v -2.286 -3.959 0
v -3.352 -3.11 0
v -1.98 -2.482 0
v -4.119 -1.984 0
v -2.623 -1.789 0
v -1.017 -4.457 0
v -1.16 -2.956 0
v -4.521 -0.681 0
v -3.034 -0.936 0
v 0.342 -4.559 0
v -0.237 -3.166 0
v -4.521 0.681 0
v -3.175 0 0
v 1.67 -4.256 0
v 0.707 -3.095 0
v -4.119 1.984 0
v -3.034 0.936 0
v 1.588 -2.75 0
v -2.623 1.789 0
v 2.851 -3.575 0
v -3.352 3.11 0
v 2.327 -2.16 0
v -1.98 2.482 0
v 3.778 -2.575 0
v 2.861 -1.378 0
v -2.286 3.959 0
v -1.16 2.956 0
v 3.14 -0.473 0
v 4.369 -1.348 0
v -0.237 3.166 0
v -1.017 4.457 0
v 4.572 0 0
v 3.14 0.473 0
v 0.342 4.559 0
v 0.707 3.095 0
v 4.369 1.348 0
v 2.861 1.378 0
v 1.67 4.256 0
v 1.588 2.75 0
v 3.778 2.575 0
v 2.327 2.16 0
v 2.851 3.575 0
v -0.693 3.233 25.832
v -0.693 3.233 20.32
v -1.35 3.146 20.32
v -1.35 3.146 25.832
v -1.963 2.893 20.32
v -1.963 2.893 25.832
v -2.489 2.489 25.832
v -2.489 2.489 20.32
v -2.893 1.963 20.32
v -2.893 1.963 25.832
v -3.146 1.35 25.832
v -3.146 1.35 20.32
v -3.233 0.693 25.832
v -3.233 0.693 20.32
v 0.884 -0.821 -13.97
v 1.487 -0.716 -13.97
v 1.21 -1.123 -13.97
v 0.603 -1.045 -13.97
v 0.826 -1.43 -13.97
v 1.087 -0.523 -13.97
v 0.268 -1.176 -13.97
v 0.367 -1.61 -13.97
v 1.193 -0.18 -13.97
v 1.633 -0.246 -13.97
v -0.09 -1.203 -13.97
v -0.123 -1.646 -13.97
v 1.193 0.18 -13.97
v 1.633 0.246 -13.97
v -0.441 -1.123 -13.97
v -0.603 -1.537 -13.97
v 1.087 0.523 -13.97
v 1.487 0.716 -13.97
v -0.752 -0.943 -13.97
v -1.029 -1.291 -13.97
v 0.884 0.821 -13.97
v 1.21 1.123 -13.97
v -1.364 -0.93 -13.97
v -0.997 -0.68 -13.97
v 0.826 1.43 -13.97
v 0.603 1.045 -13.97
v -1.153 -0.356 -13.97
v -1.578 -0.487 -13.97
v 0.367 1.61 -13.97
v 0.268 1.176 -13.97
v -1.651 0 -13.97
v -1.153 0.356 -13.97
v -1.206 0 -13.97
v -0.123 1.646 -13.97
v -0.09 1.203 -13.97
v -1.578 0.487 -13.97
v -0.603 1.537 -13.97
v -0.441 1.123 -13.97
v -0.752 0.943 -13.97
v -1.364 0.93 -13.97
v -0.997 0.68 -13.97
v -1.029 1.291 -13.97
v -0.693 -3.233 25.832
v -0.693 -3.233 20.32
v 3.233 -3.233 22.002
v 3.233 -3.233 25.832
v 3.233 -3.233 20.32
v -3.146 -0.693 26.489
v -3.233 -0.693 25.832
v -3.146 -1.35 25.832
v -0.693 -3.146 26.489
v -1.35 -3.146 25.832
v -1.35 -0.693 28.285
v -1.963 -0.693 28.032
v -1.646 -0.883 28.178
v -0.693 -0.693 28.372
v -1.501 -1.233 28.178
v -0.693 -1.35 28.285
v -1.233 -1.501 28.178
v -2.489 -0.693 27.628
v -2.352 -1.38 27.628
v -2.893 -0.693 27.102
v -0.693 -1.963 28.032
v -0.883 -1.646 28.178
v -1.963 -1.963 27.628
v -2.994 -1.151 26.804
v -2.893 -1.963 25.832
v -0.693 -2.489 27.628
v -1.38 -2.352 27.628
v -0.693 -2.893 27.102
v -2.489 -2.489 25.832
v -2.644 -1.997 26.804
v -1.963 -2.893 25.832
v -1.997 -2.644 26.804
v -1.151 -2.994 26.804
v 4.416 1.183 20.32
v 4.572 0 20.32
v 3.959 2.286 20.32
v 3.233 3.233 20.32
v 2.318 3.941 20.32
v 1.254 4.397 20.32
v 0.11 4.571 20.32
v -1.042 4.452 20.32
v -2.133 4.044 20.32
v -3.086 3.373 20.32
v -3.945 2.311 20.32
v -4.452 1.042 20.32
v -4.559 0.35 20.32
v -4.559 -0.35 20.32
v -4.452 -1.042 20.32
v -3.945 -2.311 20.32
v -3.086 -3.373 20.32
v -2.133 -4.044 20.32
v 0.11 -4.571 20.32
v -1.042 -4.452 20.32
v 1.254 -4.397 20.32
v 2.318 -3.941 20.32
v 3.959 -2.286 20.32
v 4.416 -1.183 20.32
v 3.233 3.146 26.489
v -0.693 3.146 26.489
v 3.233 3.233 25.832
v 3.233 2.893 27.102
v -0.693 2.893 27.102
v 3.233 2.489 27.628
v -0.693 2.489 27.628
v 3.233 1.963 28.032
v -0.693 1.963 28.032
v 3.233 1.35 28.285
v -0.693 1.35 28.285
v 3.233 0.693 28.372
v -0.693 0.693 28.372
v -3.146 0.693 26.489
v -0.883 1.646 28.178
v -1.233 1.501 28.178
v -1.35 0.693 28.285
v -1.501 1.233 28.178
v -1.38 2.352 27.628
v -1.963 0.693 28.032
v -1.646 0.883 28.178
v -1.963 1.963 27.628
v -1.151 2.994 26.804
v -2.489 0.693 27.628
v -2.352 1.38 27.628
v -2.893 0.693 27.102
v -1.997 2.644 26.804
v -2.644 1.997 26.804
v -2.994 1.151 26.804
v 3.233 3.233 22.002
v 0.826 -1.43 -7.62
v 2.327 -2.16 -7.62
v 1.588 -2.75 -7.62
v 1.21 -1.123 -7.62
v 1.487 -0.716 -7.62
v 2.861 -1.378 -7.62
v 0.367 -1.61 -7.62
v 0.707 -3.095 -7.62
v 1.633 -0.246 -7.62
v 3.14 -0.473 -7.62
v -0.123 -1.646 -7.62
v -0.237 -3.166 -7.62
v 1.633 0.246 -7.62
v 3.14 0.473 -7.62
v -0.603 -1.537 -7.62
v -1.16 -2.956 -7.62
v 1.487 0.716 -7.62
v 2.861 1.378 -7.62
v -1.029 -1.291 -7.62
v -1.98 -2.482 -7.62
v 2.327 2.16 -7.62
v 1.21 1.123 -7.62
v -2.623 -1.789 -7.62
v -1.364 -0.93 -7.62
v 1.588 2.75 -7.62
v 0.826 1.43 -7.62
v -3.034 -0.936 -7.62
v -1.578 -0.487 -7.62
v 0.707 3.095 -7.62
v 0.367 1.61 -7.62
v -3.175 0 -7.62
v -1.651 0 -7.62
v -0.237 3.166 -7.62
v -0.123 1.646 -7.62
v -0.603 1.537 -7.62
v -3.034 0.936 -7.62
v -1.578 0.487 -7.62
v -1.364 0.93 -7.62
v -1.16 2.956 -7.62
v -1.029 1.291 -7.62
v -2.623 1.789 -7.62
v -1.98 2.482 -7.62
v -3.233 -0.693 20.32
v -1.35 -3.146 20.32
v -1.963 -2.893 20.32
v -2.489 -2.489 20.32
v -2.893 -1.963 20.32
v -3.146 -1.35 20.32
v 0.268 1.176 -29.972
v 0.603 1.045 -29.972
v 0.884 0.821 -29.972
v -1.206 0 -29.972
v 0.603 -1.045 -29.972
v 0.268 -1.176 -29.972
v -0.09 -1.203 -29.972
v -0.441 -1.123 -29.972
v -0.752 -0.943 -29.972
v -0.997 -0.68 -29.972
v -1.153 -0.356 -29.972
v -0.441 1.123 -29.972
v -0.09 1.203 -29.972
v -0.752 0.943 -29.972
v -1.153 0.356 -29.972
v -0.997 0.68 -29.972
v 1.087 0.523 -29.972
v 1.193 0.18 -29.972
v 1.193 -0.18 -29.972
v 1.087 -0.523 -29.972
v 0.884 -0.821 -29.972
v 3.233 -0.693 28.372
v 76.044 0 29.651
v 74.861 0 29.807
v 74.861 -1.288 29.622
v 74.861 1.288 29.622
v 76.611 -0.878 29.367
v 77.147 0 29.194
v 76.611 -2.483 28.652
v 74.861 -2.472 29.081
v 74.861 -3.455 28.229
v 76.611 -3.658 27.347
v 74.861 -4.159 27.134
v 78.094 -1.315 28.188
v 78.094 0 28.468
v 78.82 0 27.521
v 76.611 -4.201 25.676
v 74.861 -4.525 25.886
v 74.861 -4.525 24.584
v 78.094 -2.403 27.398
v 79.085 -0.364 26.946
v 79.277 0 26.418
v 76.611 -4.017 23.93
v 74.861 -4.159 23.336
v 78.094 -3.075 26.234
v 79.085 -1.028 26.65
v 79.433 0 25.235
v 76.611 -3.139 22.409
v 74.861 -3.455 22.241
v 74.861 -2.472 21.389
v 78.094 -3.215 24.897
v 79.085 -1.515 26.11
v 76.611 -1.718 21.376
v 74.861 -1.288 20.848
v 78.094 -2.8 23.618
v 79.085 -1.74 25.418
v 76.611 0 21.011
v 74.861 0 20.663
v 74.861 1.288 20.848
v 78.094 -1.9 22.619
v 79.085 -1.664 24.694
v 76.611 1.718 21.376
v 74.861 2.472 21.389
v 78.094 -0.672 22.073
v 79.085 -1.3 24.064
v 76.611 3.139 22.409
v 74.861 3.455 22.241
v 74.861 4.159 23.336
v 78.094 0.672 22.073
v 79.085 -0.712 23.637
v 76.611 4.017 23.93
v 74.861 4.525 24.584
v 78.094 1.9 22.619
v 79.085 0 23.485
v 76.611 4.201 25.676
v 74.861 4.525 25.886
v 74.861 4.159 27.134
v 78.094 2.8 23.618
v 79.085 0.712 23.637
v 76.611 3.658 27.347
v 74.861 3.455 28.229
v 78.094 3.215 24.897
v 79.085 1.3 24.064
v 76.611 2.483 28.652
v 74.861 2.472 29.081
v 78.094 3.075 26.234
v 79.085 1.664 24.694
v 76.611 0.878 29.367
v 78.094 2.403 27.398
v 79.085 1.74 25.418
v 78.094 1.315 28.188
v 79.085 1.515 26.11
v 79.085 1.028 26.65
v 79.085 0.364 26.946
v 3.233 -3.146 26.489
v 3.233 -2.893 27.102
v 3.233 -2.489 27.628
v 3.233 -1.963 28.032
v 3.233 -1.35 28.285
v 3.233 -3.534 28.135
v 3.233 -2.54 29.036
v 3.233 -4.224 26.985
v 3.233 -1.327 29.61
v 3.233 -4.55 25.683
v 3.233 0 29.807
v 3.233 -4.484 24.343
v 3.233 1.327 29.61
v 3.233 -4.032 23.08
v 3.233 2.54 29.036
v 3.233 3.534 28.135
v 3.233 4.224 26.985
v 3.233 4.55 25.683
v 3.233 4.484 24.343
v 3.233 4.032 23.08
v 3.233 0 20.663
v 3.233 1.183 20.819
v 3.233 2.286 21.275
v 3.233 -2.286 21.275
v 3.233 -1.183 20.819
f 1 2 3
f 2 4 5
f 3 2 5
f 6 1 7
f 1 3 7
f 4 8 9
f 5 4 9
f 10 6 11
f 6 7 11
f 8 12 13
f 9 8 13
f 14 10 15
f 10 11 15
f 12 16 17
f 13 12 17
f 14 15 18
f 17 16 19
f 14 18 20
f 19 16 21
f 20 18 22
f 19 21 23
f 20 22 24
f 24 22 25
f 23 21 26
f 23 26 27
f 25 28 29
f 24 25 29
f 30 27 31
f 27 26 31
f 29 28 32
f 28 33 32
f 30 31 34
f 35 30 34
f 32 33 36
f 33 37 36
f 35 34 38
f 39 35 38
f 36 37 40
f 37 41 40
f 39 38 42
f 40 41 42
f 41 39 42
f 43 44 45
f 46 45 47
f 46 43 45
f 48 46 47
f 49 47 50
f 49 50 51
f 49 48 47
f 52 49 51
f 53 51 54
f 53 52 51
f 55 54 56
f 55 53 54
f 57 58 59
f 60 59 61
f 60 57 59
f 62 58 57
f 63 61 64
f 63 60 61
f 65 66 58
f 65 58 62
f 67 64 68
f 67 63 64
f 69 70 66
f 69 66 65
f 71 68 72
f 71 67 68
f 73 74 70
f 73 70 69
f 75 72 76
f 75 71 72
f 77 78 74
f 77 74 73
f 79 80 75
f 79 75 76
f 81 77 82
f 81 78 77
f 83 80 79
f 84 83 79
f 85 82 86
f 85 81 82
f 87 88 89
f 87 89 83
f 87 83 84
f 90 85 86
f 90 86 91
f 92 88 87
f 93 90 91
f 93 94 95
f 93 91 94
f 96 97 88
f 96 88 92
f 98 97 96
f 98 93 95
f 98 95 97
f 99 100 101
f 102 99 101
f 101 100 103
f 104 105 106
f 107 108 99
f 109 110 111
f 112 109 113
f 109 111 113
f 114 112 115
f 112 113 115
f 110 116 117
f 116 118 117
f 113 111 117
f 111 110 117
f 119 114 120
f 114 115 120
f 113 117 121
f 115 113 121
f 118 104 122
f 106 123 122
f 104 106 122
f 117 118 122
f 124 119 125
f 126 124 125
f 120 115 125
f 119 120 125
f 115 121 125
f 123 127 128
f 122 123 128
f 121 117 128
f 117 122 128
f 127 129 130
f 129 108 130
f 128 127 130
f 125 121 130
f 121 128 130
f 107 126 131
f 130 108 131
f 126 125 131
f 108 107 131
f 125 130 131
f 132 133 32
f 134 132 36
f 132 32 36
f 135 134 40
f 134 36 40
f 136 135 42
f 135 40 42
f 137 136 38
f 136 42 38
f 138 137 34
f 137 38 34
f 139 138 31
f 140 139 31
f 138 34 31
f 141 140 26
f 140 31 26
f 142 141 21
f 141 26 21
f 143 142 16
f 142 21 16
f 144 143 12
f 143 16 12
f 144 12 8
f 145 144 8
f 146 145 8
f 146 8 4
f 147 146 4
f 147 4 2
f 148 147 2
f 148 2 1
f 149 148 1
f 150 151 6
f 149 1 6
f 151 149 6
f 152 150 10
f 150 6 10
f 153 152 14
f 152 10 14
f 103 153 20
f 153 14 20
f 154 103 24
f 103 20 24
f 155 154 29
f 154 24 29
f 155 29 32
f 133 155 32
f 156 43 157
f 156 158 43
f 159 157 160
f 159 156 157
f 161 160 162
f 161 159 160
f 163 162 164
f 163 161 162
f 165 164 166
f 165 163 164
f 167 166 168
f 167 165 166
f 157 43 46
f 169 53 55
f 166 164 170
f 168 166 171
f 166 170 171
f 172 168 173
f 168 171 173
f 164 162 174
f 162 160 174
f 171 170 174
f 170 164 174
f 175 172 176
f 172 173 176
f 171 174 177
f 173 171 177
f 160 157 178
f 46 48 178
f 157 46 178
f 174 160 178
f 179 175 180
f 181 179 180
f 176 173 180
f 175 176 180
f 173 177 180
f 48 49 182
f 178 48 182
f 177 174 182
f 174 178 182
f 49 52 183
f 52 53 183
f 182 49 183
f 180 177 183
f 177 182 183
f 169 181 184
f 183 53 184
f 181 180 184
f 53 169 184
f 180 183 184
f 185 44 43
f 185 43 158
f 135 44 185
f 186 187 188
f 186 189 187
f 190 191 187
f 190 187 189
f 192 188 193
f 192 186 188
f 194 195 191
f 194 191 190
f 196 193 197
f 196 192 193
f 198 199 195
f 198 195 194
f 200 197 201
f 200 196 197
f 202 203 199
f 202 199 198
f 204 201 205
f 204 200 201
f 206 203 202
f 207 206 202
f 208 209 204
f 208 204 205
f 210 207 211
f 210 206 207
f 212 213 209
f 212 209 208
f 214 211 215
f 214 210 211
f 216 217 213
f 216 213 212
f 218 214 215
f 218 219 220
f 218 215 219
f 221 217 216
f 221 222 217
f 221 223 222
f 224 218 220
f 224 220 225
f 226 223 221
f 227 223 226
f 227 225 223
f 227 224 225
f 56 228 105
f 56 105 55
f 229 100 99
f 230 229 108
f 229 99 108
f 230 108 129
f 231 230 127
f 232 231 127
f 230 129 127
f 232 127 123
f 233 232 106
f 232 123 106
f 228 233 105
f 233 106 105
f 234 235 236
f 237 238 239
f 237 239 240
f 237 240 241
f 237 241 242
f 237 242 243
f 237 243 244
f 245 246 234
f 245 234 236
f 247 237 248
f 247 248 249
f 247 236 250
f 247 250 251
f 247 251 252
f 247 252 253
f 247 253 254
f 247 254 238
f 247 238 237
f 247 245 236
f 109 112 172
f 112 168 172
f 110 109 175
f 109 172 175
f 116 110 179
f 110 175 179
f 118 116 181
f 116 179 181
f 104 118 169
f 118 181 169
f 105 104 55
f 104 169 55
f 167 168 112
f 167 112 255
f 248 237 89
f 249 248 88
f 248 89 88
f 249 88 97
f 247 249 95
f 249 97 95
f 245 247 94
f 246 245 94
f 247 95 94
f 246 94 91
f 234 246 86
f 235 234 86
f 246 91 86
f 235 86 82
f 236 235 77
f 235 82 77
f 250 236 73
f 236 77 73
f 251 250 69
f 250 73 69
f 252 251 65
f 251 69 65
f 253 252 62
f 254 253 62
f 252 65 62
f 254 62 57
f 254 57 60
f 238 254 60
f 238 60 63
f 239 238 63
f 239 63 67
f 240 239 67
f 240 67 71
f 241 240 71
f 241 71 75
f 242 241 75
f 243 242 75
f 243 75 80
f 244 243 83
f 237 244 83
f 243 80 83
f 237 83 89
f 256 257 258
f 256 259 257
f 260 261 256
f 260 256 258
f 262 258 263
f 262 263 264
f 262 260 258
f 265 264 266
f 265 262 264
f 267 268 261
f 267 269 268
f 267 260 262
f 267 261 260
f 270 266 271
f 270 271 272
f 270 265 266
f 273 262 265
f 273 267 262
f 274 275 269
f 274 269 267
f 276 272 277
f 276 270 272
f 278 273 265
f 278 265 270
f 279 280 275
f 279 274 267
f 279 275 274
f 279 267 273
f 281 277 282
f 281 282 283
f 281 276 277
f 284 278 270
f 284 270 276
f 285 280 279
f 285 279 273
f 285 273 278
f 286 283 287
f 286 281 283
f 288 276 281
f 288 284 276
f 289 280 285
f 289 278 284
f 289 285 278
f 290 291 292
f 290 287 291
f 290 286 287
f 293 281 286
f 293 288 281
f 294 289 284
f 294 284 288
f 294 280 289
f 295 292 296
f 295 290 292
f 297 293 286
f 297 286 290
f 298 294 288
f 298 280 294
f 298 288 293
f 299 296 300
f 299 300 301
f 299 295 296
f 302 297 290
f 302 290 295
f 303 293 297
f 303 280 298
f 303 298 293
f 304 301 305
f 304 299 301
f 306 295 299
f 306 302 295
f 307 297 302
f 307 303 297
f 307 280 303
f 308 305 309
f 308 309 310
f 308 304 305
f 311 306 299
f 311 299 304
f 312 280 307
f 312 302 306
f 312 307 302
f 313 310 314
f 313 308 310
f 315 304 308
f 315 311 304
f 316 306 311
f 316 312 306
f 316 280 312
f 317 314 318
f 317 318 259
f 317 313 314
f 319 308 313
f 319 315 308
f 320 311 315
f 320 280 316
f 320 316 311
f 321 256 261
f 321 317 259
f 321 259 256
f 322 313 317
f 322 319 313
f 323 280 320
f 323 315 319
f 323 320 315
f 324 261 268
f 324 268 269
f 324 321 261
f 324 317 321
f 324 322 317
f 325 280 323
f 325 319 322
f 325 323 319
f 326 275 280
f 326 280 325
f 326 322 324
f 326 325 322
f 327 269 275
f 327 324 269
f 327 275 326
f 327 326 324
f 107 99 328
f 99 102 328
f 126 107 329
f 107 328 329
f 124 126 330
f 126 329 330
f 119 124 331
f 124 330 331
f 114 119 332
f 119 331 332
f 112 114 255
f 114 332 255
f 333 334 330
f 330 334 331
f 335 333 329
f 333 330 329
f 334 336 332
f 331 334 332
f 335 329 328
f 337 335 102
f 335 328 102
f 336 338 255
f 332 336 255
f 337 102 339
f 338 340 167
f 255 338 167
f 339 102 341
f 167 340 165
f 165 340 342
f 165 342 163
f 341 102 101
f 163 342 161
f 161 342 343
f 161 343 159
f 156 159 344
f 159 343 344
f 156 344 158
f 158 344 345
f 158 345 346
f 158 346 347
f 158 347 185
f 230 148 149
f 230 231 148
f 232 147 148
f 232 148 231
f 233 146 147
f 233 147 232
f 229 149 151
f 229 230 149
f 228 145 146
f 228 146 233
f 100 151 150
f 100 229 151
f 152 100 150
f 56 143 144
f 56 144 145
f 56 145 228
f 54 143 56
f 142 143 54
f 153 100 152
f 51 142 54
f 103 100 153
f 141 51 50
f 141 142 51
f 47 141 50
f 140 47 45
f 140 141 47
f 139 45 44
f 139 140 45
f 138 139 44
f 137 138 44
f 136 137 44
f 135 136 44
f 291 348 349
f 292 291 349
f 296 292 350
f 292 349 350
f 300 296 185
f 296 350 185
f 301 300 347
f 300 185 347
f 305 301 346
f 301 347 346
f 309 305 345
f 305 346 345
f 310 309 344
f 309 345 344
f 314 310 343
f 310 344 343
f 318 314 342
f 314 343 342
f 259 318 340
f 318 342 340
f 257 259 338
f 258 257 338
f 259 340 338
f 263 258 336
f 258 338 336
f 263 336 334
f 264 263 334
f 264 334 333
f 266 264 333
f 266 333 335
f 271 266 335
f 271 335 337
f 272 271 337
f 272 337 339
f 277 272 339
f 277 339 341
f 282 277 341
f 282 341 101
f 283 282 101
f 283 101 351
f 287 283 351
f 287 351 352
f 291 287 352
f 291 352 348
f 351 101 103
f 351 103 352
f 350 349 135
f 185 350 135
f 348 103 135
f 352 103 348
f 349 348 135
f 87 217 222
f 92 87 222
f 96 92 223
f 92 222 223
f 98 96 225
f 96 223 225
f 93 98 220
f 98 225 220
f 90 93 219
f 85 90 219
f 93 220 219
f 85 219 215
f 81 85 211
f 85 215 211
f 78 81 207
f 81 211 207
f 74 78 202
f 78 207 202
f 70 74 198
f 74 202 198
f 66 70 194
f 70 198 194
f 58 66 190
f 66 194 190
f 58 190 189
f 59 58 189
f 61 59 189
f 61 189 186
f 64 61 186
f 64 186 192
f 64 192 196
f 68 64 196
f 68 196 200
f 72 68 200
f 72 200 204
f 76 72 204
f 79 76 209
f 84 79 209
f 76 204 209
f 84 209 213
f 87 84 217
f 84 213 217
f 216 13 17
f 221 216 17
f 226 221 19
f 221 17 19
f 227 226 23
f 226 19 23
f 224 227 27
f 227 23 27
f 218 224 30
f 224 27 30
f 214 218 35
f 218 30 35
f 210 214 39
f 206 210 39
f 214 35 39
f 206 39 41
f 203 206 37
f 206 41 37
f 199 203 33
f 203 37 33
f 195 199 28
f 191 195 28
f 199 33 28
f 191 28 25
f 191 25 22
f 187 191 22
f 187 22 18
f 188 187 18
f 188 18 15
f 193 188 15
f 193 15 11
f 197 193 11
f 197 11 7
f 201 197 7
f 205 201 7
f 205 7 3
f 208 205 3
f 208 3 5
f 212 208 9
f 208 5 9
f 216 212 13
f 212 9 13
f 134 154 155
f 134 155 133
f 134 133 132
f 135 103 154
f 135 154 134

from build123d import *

# Parameters (mm, degrees)
SKETCH1_R           = 4.572
BOSS_EXTRUDE1_DEPTH = 20.32
SKETCH2_R           = 3.175
BOSS_EXTRUDE2_DEPTH = 7.62
SKETCH3_R           = 1.651
BOSS_EXTRUDE3_DEPTH = 6.35
SKETCH4_R           = 1.2065
BOSS_EXTRUDE4_DEPTH = 16.002
SKETCH8_W           = 6.465784408
SKETCH8_H           = 6.465784408
BOSS_EXTRUDE5_DEPTH = 8.0518
SKETCH10_R          = 4.572
BOSS_EXTRUDE6_DEPTH = 71.628
DOME4_FACE_RADIUS   = 4.572
DOME4_HEIGHT        = 4.572
FILLET1_R           = 2.54


with BuildPart() as part:
    # Sketch1 → Boss-Extrude1 (new body)
    with BuildSketch(Plane.XY):
        Circle(SKETCH1_R)
    extrude(amount=BOSS_EXTRUDE1_DEPTH)

    # Sketch2 → Boss-Extrude2 (add)
    with BuildSketch(Plane(origin=(0, 0, 0), x_dir=(-1, 0, 0), z_dir=(0, 0, -1))):
        Circle(SKETCH2_R)
    extrude(amount=BOSS_EXTRUDE2_DEPTH)

    # Sketch3 → Boss-Extrude3 (add)
    with BuildSketch(Plane(origin=(0, 0, -7.62), x_dir=(-1, 0, 0), z_dir=(0, 0, -1))):
        Circle(SKETCH3_R)
    extrude(amount=BOSS_EXTRUDE3_DEPTH)

    # Sketch4 → Boss-Extrude4 (add)
    with BuildSketch(Plane(origin=(0, 0, -13.97), x_dir=(-1, 0, 0), z_dir=(0, 0, -1))):
        Circle(SKETCH4_R)
    extrude(amount=BOSS_EXTRUDE4_DEPTH)

    # Sketch8 → Boss-Extrude5 (add)
    with BuildSketch(Plane.XY.offset(20.32)):
        Rectangle(SKETCH8_W, SKETCH8_H)
    extrude(amount=BOSS_EXTRUDE5_DEPTH)

    # Sketch10 → Boss-Extrude6 (add)
    with BuildSketch(Plane(origin=(3.232892204, 0, 0), x_dir=(0, 0, -1), z_dir=(1, 0, 0))):
        with Locations((-25.2349, 0)):
            Circle(SKETCH10_R)
    extrude(amount=BOSS_EXTRUDE6_DEPTH)

    # Dome4: a dome of height H over a round flat face of radius A is a cap of a sphere of radius (A * A + H * H) / (2 * H)
    dome4_r = (DOME4_FACE_RADIUS * DOME4_FACE_RADIUS + DOME4_HEIGHT * DOME4_HEIGHT) / (2 * DOME4_HEIGHT)
    dome4_base = Plane((74.860892204, 0, 25.2349), z_dir=(1, 0, 0))
    with Locations(dome4_base.offset(DOME4_HEIGHT - dome4_r)):
        dome4_ball = Sphere(dome4_r, mode=Mode.PRIVATE)
    add(split(dome4_ball, bisect_by=dome4_base, keep=Keep.TOP, mode=Mode.PRIVATE))

    # Fillet1
    fillet1_edges = [part.edges().sort_by_distance(p)[0] for p in [
        (-3.232892204, 3.232892204, 24.3459),
        (-3.232892204, -3.232892204, 24.3459),
        (0, 3.232892204, 28.3718),
        (-3.232892204, 0, 28.3718),
        (0, -3.232892204, 28.3718),
    ]]
    fillet(fillet1_edges, radius=FILLET1_R)


solid = part.part
